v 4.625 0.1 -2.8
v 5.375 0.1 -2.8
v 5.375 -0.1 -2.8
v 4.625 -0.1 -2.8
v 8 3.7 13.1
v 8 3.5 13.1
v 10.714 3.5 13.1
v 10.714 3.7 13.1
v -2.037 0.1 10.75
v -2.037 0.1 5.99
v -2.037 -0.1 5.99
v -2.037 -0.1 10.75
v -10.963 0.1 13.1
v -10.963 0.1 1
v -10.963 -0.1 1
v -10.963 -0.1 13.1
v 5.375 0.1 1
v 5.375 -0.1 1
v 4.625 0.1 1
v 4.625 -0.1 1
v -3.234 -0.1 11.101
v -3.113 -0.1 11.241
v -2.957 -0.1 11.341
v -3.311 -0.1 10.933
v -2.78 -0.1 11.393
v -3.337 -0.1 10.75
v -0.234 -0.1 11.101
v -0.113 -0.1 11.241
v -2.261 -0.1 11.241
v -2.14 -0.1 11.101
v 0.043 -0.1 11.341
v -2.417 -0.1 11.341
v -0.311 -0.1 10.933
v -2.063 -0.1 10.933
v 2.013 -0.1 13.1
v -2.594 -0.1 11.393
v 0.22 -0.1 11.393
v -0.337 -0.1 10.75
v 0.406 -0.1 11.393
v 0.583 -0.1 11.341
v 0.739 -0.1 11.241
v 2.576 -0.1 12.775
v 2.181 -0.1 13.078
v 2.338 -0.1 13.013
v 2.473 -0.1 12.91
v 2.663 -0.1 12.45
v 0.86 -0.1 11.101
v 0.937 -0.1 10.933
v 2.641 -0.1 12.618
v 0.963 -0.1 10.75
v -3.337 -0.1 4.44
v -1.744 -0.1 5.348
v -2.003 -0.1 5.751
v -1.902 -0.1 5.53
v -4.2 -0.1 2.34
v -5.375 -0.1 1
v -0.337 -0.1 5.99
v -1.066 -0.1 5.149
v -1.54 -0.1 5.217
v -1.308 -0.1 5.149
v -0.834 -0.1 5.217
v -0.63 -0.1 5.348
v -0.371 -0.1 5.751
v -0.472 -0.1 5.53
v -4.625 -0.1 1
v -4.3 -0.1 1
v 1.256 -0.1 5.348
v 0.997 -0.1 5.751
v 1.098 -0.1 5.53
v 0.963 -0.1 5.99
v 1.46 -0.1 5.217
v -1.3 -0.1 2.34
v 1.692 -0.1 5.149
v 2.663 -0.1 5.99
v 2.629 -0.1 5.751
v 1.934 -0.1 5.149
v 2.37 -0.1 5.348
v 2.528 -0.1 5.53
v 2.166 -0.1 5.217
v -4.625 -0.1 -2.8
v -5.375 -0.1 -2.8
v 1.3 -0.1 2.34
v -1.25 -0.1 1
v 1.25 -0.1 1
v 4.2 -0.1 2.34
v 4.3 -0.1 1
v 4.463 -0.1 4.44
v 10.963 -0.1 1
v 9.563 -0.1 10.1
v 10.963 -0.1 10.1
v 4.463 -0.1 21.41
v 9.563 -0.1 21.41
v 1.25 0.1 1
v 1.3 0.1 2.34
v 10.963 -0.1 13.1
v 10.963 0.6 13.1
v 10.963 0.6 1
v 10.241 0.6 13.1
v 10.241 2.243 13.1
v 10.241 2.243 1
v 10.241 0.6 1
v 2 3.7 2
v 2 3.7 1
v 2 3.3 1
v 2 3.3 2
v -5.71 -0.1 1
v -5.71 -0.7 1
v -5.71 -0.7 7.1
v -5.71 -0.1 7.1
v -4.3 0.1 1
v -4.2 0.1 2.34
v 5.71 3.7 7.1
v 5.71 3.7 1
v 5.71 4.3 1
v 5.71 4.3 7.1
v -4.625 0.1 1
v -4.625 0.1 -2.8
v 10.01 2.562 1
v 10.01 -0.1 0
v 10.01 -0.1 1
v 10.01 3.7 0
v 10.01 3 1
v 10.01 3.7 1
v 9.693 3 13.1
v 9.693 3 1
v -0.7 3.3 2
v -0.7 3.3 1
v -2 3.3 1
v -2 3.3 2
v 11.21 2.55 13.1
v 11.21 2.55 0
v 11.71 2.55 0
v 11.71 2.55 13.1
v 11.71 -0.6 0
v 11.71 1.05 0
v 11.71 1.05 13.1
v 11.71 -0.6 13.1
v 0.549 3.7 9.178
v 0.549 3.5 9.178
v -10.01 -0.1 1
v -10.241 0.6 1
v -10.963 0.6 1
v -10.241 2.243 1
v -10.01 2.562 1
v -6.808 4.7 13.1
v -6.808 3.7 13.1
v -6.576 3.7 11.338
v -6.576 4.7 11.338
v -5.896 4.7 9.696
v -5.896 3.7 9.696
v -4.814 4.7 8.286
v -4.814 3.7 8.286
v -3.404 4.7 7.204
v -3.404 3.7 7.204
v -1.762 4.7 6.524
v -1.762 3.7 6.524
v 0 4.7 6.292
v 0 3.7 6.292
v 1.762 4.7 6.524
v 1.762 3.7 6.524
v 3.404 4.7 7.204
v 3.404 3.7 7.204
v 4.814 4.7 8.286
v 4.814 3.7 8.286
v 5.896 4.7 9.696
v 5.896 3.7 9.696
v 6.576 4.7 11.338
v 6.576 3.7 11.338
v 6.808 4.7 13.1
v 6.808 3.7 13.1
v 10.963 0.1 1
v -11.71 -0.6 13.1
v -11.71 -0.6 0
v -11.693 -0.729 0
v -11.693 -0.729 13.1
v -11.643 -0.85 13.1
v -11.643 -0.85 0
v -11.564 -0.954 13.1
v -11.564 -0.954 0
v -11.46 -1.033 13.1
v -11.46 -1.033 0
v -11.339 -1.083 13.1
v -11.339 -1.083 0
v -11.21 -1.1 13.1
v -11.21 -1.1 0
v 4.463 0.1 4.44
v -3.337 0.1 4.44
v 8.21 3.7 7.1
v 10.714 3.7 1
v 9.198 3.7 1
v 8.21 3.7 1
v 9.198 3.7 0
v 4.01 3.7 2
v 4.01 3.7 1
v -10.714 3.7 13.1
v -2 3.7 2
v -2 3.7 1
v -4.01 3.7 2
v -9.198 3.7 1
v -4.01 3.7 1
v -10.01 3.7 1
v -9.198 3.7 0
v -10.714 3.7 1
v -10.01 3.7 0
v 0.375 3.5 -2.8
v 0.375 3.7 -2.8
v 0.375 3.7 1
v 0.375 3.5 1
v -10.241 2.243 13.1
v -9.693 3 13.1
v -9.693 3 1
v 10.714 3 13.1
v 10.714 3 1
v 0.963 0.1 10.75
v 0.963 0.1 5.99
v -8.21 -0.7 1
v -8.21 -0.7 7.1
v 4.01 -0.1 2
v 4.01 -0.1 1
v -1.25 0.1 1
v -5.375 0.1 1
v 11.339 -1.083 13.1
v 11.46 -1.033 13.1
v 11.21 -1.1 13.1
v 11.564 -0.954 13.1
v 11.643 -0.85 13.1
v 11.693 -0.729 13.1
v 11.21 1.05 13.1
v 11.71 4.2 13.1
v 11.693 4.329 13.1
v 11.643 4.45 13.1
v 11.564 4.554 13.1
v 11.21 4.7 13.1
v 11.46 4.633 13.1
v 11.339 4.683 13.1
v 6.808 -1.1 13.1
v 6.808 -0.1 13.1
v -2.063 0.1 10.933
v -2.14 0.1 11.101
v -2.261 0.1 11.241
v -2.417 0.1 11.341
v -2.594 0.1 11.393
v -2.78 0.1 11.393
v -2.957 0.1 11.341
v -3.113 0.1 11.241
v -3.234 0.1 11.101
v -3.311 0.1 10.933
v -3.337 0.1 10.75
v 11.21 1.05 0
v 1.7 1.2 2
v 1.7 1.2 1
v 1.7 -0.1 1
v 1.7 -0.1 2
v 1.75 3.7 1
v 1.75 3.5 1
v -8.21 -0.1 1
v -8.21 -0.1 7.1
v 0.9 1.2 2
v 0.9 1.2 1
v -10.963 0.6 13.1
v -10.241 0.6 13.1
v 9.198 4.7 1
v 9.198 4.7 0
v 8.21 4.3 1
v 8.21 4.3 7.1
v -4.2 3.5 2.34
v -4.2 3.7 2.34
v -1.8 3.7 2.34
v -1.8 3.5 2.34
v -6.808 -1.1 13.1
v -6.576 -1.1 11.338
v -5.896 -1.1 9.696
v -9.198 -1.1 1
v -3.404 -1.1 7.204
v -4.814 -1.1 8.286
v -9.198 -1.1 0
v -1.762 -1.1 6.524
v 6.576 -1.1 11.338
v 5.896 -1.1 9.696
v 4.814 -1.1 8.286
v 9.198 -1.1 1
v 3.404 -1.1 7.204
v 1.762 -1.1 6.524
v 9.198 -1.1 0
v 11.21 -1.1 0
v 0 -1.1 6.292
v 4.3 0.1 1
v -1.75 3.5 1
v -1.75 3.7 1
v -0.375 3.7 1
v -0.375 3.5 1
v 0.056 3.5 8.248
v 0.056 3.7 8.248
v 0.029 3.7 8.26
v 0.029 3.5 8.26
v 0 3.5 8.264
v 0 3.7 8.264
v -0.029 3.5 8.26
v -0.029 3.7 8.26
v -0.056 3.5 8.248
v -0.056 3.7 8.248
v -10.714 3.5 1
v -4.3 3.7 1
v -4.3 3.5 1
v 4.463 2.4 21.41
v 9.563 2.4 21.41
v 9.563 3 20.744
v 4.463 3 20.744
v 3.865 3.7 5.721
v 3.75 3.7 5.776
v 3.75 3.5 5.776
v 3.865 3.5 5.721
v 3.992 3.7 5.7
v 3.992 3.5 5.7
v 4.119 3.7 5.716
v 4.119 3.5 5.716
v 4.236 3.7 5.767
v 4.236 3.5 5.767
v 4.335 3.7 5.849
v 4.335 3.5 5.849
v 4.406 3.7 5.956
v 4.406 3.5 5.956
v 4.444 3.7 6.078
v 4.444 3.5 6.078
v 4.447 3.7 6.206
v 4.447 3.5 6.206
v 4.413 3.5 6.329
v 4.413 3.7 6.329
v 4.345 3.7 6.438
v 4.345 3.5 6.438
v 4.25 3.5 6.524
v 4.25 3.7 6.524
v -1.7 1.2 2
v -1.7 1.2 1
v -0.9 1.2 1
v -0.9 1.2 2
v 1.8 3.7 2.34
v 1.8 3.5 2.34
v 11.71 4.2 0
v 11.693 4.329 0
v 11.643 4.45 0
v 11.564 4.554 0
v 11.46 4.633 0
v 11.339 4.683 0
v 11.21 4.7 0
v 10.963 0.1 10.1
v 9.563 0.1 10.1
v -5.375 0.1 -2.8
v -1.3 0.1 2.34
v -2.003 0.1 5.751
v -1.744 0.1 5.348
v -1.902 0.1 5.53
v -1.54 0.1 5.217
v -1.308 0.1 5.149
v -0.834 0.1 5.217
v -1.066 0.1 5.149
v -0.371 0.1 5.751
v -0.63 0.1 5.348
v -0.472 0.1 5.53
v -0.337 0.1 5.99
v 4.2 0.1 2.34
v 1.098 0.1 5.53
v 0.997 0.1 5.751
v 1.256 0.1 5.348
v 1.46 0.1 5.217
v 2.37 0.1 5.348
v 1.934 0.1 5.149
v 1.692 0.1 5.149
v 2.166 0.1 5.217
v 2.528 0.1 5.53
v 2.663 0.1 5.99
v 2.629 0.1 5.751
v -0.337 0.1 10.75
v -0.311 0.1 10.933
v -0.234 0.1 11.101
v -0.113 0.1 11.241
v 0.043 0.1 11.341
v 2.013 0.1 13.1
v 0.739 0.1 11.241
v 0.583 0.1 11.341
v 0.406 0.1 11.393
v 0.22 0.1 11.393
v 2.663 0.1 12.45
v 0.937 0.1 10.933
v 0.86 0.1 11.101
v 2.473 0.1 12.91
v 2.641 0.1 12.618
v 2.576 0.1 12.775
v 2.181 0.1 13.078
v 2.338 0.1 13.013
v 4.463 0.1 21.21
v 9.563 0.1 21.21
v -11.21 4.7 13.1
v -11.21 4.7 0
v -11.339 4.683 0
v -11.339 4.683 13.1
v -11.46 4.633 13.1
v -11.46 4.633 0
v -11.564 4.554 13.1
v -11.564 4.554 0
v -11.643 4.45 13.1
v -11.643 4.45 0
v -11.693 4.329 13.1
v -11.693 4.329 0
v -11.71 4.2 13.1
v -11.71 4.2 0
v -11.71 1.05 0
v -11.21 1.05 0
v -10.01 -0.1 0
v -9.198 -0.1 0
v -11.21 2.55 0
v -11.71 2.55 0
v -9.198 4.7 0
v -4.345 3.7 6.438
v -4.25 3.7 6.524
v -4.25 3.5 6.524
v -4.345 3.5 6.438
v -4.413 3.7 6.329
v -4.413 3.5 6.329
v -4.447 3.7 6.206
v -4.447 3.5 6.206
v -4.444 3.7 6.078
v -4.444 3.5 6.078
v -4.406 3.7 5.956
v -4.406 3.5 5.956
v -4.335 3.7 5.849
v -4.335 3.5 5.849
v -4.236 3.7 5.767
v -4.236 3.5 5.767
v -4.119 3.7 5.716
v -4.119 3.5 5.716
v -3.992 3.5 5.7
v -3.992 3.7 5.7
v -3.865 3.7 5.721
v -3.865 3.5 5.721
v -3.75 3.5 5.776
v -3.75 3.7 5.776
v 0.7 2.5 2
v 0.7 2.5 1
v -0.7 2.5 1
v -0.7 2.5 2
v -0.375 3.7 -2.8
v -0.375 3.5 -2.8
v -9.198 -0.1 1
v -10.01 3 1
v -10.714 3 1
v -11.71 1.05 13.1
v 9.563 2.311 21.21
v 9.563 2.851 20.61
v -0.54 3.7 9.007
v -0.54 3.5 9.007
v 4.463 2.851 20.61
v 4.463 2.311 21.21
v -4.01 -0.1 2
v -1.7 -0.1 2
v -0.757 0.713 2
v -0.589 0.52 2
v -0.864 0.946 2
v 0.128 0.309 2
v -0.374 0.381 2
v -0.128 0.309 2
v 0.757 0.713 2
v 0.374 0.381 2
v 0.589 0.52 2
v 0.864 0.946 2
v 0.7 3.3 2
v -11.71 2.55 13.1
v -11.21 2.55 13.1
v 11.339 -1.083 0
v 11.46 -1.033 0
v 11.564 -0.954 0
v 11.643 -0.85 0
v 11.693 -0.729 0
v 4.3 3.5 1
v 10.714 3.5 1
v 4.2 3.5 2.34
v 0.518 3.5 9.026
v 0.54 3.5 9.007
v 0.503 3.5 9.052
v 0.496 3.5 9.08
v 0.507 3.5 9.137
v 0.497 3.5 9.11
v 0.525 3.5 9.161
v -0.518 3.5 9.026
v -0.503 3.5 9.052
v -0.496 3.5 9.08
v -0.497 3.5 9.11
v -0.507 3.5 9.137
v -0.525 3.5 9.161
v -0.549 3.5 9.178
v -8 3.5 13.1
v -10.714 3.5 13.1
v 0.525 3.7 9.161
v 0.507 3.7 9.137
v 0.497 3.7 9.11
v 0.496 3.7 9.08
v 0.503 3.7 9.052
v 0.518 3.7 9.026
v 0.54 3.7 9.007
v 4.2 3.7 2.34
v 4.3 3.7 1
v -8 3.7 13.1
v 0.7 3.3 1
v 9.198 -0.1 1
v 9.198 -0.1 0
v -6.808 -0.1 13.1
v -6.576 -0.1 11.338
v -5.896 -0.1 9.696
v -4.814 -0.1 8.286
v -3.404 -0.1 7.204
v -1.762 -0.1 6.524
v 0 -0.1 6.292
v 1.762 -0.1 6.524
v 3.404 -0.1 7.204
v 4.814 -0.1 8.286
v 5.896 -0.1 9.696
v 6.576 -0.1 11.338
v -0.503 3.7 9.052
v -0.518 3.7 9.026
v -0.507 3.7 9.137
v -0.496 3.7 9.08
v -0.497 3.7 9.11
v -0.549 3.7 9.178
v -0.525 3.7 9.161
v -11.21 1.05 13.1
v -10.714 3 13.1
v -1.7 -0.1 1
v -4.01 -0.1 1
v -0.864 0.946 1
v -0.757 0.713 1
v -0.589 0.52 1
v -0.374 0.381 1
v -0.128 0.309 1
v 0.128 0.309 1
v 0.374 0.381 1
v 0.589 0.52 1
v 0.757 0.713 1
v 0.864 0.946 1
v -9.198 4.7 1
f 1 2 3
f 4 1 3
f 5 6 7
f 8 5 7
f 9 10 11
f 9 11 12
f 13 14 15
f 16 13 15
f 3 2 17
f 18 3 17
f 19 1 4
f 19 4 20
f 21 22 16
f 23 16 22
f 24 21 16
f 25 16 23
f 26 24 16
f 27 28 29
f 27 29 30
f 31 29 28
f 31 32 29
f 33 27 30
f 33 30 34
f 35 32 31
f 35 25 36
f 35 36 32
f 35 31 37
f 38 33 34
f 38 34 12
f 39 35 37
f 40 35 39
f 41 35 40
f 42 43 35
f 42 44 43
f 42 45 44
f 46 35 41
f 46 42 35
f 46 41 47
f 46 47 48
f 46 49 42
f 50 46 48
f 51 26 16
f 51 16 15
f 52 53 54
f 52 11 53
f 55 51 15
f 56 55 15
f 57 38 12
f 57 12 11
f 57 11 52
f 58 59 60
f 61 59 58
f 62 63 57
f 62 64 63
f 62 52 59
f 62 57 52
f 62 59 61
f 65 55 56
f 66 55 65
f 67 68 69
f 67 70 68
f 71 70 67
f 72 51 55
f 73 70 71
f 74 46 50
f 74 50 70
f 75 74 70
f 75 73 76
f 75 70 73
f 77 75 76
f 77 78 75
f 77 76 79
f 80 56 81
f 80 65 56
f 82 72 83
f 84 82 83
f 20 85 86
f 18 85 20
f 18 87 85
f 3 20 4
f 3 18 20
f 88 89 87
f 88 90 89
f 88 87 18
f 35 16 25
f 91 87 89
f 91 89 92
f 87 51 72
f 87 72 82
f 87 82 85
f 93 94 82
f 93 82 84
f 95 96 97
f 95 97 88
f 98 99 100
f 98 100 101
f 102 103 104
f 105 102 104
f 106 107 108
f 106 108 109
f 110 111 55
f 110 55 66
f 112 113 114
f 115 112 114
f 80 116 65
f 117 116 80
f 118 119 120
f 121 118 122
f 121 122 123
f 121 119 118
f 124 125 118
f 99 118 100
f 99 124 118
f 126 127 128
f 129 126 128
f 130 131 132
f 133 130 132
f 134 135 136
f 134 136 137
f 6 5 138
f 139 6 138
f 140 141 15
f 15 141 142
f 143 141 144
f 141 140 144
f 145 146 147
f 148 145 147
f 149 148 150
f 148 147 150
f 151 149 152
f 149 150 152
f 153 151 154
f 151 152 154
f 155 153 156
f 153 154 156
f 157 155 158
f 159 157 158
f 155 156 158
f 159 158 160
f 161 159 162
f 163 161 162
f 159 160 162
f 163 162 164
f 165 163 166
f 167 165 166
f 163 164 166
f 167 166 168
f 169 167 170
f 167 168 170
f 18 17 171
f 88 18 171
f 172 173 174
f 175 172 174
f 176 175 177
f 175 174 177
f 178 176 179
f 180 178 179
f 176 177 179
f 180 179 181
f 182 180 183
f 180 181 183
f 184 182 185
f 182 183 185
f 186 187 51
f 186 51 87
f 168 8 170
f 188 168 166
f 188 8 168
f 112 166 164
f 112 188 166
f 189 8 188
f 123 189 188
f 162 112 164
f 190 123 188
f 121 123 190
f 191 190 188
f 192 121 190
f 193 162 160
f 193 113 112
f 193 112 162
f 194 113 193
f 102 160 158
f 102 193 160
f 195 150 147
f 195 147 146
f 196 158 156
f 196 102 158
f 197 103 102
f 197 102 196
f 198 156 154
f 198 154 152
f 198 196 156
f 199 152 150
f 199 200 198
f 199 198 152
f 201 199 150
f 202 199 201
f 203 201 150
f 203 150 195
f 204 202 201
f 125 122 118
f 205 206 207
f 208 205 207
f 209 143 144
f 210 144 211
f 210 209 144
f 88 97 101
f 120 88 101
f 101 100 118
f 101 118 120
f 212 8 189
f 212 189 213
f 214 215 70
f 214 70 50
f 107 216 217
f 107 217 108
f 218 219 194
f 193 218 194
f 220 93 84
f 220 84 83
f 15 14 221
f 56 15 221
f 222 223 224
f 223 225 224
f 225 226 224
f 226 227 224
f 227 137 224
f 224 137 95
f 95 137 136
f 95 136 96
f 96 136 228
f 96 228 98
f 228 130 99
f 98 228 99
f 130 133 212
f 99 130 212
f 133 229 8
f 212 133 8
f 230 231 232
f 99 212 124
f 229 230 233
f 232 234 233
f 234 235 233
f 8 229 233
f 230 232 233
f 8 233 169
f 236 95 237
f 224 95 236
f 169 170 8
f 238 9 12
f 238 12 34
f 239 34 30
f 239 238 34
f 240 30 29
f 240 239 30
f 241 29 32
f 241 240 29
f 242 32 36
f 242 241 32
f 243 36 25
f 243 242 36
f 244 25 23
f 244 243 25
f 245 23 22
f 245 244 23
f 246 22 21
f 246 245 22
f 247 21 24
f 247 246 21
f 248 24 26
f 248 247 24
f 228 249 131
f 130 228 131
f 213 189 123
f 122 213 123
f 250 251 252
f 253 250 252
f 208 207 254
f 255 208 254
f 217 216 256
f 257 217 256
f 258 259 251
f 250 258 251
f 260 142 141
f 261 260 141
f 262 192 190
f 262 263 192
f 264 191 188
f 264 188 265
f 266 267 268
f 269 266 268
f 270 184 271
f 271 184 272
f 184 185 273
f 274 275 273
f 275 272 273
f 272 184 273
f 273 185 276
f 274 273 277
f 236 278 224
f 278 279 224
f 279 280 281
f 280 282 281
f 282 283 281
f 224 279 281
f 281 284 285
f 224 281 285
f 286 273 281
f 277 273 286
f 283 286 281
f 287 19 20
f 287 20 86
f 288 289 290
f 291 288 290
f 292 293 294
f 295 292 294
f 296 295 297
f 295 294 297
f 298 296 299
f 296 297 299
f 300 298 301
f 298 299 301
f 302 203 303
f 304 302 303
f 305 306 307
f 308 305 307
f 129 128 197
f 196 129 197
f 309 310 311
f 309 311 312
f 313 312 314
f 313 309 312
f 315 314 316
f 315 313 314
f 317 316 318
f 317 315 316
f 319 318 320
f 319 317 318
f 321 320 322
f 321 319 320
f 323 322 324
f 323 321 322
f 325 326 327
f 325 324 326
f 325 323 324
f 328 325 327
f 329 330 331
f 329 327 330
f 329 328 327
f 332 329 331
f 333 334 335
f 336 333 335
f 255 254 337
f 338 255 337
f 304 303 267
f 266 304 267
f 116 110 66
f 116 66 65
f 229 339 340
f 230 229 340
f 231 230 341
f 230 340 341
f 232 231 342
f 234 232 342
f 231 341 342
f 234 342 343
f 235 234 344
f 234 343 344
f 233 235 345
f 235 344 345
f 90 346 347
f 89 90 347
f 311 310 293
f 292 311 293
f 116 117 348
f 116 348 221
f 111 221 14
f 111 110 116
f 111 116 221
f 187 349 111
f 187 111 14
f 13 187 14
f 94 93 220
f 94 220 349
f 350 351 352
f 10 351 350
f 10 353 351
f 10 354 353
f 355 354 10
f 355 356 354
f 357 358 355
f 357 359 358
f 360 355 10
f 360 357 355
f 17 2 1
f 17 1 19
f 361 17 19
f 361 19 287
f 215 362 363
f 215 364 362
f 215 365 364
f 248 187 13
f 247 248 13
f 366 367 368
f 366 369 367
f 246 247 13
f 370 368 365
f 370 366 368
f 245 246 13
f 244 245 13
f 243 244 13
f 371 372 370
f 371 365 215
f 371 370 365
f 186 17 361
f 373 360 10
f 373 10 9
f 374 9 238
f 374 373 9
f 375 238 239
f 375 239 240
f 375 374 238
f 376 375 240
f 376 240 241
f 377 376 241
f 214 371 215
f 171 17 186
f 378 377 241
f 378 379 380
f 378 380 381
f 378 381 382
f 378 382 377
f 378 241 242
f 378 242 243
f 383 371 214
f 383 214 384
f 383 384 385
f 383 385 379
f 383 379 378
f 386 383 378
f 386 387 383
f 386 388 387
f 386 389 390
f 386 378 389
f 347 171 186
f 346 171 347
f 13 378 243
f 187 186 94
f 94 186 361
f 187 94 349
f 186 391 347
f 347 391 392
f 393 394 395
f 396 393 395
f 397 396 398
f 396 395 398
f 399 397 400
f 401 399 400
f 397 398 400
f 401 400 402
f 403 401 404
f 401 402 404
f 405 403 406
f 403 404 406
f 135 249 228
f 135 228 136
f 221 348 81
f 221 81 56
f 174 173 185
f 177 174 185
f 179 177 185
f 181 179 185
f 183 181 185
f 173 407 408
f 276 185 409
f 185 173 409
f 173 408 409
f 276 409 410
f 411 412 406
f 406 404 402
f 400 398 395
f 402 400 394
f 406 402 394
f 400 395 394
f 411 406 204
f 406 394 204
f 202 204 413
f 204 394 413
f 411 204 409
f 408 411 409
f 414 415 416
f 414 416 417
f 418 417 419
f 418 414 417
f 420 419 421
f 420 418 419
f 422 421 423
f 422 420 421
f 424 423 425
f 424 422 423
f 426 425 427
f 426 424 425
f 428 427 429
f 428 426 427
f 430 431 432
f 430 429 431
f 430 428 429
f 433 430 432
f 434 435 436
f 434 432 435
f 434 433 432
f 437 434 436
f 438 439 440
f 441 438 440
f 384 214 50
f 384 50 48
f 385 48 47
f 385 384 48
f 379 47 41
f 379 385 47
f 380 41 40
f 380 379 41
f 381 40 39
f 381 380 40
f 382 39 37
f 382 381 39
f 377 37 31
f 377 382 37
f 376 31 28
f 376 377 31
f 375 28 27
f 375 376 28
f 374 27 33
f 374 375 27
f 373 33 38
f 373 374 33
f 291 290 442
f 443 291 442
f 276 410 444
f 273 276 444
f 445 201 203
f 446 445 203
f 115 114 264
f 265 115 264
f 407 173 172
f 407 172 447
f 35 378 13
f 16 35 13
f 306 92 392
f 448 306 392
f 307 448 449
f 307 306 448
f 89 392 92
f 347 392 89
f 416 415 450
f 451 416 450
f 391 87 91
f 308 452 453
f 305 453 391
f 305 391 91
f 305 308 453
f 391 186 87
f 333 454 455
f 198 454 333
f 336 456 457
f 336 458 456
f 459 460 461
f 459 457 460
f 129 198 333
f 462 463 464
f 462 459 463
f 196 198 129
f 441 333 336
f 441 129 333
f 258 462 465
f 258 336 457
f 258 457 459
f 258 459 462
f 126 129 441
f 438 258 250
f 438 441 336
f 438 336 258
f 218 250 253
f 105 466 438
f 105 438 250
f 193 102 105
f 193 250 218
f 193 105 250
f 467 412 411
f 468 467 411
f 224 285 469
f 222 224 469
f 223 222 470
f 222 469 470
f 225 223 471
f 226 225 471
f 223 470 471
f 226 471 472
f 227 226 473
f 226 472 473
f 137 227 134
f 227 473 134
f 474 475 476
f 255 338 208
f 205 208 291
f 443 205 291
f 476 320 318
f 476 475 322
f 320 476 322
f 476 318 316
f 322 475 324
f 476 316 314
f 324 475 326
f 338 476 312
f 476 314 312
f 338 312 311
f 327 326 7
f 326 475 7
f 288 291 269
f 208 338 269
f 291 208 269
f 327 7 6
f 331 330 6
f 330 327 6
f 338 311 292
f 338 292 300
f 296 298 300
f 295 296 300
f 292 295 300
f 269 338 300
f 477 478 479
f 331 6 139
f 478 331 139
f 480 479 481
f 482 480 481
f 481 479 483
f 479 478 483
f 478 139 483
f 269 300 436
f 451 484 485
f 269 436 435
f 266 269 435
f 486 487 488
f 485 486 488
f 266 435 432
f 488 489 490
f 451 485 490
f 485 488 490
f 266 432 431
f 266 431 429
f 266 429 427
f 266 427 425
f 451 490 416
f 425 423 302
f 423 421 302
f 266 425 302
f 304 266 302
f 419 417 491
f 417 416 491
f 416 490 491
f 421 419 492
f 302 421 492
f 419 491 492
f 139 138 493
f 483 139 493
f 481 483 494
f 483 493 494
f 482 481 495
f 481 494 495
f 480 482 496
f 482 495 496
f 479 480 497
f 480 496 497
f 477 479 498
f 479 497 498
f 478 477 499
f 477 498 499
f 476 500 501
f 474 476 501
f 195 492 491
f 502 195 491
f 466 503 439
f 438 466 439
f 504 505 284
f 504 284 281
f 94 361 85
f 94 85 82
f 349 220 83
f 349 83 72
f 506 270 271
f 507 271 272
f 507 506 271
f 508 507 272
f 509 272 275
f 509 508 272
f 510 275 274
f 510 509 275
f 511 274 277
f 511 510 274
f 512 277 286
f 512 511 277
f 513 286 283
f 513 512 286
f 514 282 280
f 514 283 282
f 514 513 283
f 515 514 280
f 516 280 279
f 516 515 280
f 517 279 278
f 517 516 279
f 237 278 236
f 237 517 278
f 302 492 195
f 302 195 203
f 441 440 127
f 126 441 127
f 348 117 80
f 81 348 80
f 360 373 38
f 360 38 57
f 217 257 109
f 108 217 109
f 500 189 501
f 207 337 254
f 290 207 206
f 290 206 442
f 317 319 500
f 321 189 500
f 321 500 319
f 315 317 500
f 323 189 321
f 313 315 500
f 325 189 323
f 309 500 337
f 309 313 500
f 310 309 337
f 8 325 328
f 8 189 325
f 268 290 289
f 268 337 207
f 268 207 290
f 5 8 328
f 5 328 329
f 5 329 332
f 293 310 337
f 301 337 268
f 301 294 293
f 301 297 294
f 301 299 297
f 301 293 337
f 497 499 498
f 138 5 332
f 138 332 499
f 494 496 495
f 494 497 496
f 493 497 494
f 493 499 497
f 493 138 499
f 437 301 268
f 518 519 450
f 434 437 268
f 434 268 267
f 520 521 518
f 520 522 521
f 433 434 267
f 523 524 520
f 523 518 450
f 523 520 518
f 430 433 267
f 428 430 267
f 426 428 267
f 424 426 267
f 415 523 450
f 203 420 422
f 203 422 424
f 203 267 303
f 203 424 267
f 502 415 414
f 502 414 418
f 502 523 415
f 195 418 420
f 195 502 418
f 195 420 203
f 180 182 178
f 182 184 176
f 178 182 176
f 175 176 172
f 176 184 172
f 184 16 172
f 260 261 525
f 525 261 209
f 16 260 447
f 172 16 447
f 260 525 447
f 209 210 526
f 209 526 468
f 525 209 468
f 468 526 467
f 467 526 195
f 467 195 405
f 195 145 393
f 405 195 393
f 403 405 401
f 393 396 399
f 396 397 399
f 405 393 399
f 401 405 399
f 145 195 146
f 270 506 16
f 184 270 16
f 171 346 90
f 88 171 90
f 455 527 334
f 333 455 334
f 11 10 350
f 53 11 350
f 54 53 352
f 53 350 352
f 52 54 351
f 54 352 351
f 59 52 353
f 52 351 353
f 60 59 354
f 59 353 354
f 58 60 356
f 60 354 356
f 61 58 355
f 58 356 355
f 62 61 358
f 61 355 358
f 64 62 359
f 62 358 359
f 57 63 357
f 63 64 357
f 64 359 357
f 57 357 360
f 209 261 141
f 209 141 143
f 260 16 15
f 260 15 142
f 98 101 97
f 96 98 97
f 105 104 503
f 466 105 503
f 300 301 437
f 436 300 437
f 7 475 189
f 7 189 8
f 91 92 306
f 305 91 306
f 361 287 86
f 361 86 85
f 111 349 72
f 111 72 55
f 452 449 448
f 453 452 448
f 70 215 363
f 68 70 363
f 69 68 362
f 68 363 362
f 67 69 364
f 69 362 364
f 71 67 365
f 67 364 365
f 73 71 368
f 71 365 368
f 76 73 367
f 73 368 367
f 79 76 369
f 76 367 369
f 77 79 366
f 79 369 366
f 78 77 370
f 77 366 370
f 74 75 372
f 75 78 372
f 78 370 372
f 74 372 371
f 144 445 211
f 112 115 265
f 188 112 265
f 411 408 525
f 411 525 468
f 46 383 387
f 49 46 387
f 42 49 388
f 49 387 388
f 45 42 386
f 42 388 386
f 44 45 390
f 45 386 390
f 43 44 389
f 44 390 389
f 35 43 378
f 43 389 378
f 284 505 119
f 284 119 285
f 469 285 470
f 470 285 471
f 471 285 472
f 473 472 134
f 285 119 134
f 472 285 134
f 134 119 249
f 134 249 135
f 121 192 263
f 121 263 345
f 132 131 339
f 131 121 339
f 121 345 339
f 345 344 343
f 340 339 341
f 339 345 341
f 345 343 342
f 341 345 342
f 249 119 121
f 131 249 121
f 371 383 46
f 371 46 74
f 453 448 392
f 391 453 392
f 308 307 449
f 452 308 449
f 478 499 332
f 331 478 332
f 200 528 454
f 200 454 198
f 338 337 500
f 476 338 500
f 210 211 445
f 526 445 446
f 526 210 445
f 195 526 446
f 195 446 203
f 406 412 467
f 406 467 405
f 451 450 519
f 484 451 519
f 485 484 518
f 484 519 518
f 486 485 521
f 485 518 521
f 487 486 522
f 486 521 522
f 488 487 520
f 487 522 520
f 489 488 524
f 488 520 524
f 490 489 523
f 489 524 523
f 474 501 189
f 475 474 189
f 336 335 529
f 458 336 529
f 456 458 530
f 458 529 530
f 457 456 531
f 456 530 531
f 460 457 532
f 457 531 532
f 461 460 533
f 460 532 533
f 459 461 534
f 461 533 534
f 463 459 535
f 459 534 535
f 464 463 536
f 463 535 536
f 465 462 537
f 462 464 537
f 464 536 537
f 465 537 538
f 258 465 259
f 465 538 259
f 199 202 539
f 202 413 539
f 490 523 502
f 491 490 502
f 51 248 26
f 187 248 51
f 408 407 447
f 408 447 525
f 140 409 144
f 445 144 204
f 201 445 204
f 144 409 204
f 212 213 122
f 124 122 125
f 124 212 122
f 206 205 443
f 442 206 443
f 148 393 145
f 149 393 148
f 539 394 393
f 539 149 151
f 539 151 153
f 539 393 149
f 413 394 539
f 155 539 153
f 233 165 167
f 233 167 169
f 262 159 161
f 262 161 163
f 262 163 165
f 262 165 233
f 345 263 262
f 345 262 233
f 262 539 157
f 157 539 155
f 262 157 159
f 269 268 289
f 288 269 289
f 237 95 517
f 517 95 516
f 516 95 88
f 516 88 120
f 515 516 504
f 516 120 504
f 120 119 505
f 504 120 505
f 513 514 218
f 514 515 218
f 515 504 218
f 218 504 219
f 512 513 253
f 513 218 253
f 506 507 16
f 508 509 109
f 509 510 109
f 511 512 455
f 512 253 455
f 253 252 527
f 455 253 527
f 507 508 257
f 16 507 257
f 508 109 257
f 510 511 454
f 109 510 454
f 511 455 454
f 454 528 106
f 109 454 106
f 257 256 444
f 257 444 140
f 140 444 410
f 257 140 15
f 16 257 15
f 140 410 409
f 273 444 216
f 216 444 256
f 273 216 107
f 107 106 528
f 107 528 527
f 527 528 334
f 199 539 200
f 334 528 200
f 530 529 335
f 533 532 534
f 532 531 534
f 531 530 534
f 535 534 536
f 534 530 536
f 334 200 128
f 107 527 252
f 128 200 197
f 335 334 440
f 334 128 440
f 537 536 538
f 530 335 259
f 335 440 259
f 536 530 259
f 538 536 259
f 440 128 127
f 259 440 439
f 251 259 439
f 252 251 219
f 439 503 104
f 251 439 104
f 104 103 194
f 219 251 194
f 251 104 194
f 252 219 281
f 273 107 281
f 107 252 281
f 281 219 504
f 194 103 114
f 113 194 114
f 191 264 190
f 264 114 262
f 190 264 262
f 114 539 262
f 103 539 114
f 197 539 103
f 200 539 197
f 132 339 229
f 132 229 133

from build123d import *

# Parameters (mm, degrees)
PAD_DEPTH            = 13.1
POCKET_DEPTH         = 12.1
SKETCH010_W          = 8.02
SKETCH010_H          = 5.8
PAD001_DEPTH         = 2
SKETCH002_R          = 6.808
SKETCH002_W          = 18.396
SKETCH002_H          = 1
POCKET001_DEPTH      = 4.701
POCKET001_DEPTH_BACK = -1.101
SKETCH003_W          = 6
SKETCH003_H          = 3.8
POCKET002_DEPTH      = 1
SKETCH009_W          = 0.5
SKETCH009_H          = 1.5
POCKET003_DEPTH      = 0.001
POCKET003_DEPTH_BACK = -13.101
SKETCH011_W          = 2.5
SKETCH011_H          = 0.7
POCKET004_DEPTH      = 7.1
PAD002_DEPTH         = 10.963
PAD002_DEPTH_BACK    = 10.963
SKETCH004_W          = 5.588
SKETCH004_H          = 3.8
POCKET005_DEPTH      = 3.001
POCKET005_DEPTH_BACK = -0.101
PAD003_DEPTH         = 0.1
PAD003_DEPTH_BACK    = 0.1
POCKET006_DEPTH      = 0.101
POCKET006_DEPTH_BACK = -0.101


with BuildPart() as pkg:
    # Sketch → Pad (new body)
    with BuildSketch(Plane.XY):
        with BuildLine():
            Line((11.71, 4.2), (11.71, -0.6))
            ThreePointArc((11.21, -1.1), (11.563553, -0.953553), (11.71, -0.6))
            Line((11.21, -1.1), (-11.21, -1.1))
            ThreePointArc((-11.71, -0.6), (-11.563553, -0.953553), (-11.21, -1.1))
            Line((-11.71, -0.6), (-11.71, 4.2))
            ThreePointArc((-11.21, 4.7), (-11.563553, 4.553553), (-11.71, 4.2))
            Line((-11.21, 4.7), (0, 4.7))
            Line((0, 4.7), (11.21, 4.7))
            ThreePointArc((11.71, 4.2), (11.563553, 4.553553), (11.21, 4.7))
        make_face()
    extrude(amount=PAD_DEPTH)

    # Sketch001 (on DatumPlane) → Pocket (cut)
    with BuildSketch(Plane.XY.offset(13.1)):
        Polygon((-10.714, 3.7), (10.714, 3.7), (10.714, 3), (9.693, 3), (10.241, 2.243), (10.241, 0.6), (10.963, 0.6), (10.963, -0.1), (-10.963, -0.1), (-10.963, 0.6), (-10.241, 0.6), (-10.241, 2.243), (-9.693, 3), (-10.714, 3), align=None)
    extrude(amount=-POCKET_DEPTH, mode=Mode.SUBTRACT)

    # Sketch010 → Pad001 (join)
    with BuildSketch(Plane.XY):
        with Locations((0, 1.8)):
            Rectangle(SKETCH010_W, SKETCH010_H)
    extrude(amount=PAD001_DEPTH)

    # Sketch002 → Pocket001 (cut, two sides)
    with BuildSketch(Plane.XZ) as pocket001_sk:
        with Locations((0, 13.1)):
            Circle(SKETCH002_R)
        with Locations((0, 0.5)):
            Rectangle(SKETCH002_W, SKETCH002_H)
    extrude(amount=-POCKET001_DEPTH, mode=Mode.SUBTRACT)
    extrude(pocket001_sk.sketch, amount=-POCKET001_DEPTH_BACK, mode=Mode.SUBTRACT)

    # Sketch003 → Pocket002 (cut)
    with BuildSketch(Plane.XY):
        with Locations((-7.01, 1.8)):
            Rectangle(SKETCH003_W, SKETCH003_H)
    pocket002 = extrude(amount=POCKET002_DEPTH, mode=Mode.SUBTRACT)

    # Mirrored: Pocket002 across Sketch003 V_Axis
    add(pocket002.mirror(Plane(origin=(0, 0, 0), x_dir=(0, 0, 1), z_dir=(1, 0, 0))), mode=Mode.SUBTRACT)

    # Sketch009 → Pocket003 (cut, two sides)
    with BuildSketch(Plane.XY) as pocket003_sk:
        with BuildLine():
            Line((0.9, 1.2), (1.7, 1.2))
            Line((1.7, 1.2), (1.7, -0.1))
            Line((1.7, -0.1), (-1.7, -0.1))
            Line((-1.7, -0.1), (-1.7, 1.2))
            Line((-1.7, 1.2), (-0.9, 1.2))
            ThreePointArc((-0.9, 1.2), (0, 0.3), (0.9, 1.2))
        make_face()
        Polygon((2, 3.7), (2, 3.3), (0.7, 3.3), (0.7, 2.5), (-0.7, 2.5), (-0.7, 3.3), (-2, 3.3), (-2, 3.7), align=None)
        with Locations((-11.46, 1.8)):
            Rectangle(SKETCH009_W, SKETCH009_H)
        with Locations((11.46, 1.8)):
            Rectangle(SKETCH009_W, SKETCH009_H)
    extrude(amount=-POCKET003_DEPTH, mode=Mode.SUBTRACT)
    extrude(pocket003_sk.sketch, amount=-POCKET003_DEPTH_BACK, mode=Mode.SUBTRACT)

    # Sketch011 → Pocket004 (cut)
    with BuildSketch(Plane.XY):
        with Locations((-6.96, -0.35)):
            Rectangle(SKETCH011_W, SKETCH011_H)
        with Locations((6.96, 3.95)):
            Rectangle(SKETCH011_W, SKETCH011_H)
    extrude(amount=POCKET004_DEPTH, mode=Mode.SUBTRACT)


with BuildPart() as pos:
    # Sketch005 → Pad002 (new body, two sides)
    with BuildSketch(Plane.YZ) as pad002_sk:
        Polygon((-0.1, 13.1), (-0.1, 21.41), (2.4, 21.41), (3, 20.74385), (2.851393, 20.61), (2.310974, 21.21), (0.1, 21.21), (0.1, 13.1), (0.1, 0), (0.1, -2.8), (-0.1, -2.8), (-0.1, 0), align=None)
    extrude(amount=PAD002_DEPTH)
    extrude(pad002_sk.sketch, amount=-PAD002_DEPTH_BACK)

    # Sketch004 → Pocket005 (cut, two sides)
    with BuildSketch(Plane.XZ) as pocket005_sk:
        with Locations((-8.169, -0.9)):
            Rectangle(SKETCH004_W, SKETCH004_H)
        with Locations((8.169, -0.9)):
            Rectangle(SKETCH004_W, SKETCH004_H)
        Polygon((4.625, -2.8), (4.625, 1), (4.3, 1), (4.2, 2.34), (1.3, 2.34), (1.25, 1), (-1.25, 1), (-1.3, 2.34), (-4.2, 2.34), (-4.3, 1), (-4.625, 1), (-4.625, -2.8), align=None)
        with BuildLine():
            Line((2.663, 12.45), (2.663, 5.99))
            ThreePointArc((0.963, 5.99), (1.813, 5.14), (2.663, 5.99))
            Line((0.963, 5.99), (0.963, 10.75))
            ThreePointArc((0.963, 10.75), (0.313, 11.4), (-0.337, 10.75))
            Line((-0.337, 10.75), (-0.337, 5.99))
            ThreePointArc((-2.037, 5.99), (-1.187, 5.14), (-0.337, 5.99))
            Line((-2.037, 5.99), (-2.037, 10.75))
            ThreePointArc((-2.037, 10.75), (-2.687, 11.4), (-3.337, 10.75))
            Line((-3.337, 10.75), (-3.337, 4.44))
            Line((-3.337, 4.44), (4.463, 4.44))
            Line((4.463, 4.44), (4.463, 13.1))
            Line((4.463, 21.41), (4.463, 13.1))
            Line((-10.963, 21.41), (4.463, 21.41))
            Line((-10.963, 13.1), (-10.963, 21.41))
            Line((2.013, 13.1), (-10.963, 13.1))
            ThreePointArc((2.663, 12.45), (2.472619, 12.909619), (2.013, 13.1))
        make_face()
        Polygon((10.963, 13.1), (10.963, 10.1), (9.563, 10.1), (9.563, 13.1), (9.563, 21.41), (10.963, 21.41), align=None)
    extrude(amount=-POCKET005_DEPTH, mode=Mode.SUBTRACT)
    extrude(pocket005_sk.sketch, amount=-POCKET005_DEPTH_BACK, mode=Mode.SUBTRACT)


with BuildPart() as neg:
    # Sketch012 (on DatumPlane) → Pad003 (new body, two sides)
    with BuildSketch(Plane.XZ.offset(-3.6)) as pad003_sk:
        Polygon((-10.714, 13.1), (10.714, 13.1), (10.714, 0), (10.714, -2.8), (-10.714, -2.8), (-10.714, 0), align=None)
    extrude(amount=PAD003_DEPTH)
    extrude(pad003_sk.sketch, amount=-PAD003_DEPTH_BACK)

    # Sketch007 (on DatumPlane) → Pocket006 (cut, two sides)
    with BuildSketch(Plane.XZ.offset(-3.6)) as pocket006_sk:
        Polygon((-10.714, 1), (-4.3, 1), (-4.2, 2.34), (-1.8, 2.34), (-1.75, 1), (-0.375, 1), (-0.375, -2.8), (-10.714, -2.8), align=None)
        Polygon((0.375, -2.8), (0.375, 1), (1.75, 1), (1.8, 2.34), (4.2, 2.34), (4.3, 1), (10.714, 1), (10.714, -2.8), align=None)
        with BuildLine():
            Line((8, 13.1), (0.548615, 9.178218))
            ThreePointArc((0.548615, 9.178218), (0.495327, 9.094983), (0.539582, 9.006613))
            Line((0.539582, 9.006613), (4.250231, 6.524011))
            ThreePointArc((3.749769, 5.775989), (4.374011, 5.899769), (4.250231, 6.524011))
            Line((3.749769, 5.775989), (0.055607, 8.24756))
            ThreePointArc((0.055607, 8.24756), (0, 8.264446), (-0.055607, 8.24756))
            Line((-0.055607, 8.24756), (-3.749769, 5.775989))
            ThreePointArc((-4.250231, 6.524011), (-4.374011, 5.899769), (-3.749769, 5.775989))
            Line((-4.250231, 6.524011), (-0.539582, 9.006613))
            ThreePointArc((-0.539582, 9.006613), (-0.495327, 9.094983), (-0.548615, 9.178218))
            Line((-0.548615, 9.178218), (-8, 13.1))
            Line((-8, 13.1), (8, 13.1))
        make_face()
    extrude(amount=-POCKET006_DEPTH, mode=Mode.SUBTRACT)
    extrude(pocket006_sk.sketch, amount=-POCKET006_DEPTH_BACK, mode=Mode.SUBTRACT)


solid = Compound([pkg.part, pos.part, neg.part])
